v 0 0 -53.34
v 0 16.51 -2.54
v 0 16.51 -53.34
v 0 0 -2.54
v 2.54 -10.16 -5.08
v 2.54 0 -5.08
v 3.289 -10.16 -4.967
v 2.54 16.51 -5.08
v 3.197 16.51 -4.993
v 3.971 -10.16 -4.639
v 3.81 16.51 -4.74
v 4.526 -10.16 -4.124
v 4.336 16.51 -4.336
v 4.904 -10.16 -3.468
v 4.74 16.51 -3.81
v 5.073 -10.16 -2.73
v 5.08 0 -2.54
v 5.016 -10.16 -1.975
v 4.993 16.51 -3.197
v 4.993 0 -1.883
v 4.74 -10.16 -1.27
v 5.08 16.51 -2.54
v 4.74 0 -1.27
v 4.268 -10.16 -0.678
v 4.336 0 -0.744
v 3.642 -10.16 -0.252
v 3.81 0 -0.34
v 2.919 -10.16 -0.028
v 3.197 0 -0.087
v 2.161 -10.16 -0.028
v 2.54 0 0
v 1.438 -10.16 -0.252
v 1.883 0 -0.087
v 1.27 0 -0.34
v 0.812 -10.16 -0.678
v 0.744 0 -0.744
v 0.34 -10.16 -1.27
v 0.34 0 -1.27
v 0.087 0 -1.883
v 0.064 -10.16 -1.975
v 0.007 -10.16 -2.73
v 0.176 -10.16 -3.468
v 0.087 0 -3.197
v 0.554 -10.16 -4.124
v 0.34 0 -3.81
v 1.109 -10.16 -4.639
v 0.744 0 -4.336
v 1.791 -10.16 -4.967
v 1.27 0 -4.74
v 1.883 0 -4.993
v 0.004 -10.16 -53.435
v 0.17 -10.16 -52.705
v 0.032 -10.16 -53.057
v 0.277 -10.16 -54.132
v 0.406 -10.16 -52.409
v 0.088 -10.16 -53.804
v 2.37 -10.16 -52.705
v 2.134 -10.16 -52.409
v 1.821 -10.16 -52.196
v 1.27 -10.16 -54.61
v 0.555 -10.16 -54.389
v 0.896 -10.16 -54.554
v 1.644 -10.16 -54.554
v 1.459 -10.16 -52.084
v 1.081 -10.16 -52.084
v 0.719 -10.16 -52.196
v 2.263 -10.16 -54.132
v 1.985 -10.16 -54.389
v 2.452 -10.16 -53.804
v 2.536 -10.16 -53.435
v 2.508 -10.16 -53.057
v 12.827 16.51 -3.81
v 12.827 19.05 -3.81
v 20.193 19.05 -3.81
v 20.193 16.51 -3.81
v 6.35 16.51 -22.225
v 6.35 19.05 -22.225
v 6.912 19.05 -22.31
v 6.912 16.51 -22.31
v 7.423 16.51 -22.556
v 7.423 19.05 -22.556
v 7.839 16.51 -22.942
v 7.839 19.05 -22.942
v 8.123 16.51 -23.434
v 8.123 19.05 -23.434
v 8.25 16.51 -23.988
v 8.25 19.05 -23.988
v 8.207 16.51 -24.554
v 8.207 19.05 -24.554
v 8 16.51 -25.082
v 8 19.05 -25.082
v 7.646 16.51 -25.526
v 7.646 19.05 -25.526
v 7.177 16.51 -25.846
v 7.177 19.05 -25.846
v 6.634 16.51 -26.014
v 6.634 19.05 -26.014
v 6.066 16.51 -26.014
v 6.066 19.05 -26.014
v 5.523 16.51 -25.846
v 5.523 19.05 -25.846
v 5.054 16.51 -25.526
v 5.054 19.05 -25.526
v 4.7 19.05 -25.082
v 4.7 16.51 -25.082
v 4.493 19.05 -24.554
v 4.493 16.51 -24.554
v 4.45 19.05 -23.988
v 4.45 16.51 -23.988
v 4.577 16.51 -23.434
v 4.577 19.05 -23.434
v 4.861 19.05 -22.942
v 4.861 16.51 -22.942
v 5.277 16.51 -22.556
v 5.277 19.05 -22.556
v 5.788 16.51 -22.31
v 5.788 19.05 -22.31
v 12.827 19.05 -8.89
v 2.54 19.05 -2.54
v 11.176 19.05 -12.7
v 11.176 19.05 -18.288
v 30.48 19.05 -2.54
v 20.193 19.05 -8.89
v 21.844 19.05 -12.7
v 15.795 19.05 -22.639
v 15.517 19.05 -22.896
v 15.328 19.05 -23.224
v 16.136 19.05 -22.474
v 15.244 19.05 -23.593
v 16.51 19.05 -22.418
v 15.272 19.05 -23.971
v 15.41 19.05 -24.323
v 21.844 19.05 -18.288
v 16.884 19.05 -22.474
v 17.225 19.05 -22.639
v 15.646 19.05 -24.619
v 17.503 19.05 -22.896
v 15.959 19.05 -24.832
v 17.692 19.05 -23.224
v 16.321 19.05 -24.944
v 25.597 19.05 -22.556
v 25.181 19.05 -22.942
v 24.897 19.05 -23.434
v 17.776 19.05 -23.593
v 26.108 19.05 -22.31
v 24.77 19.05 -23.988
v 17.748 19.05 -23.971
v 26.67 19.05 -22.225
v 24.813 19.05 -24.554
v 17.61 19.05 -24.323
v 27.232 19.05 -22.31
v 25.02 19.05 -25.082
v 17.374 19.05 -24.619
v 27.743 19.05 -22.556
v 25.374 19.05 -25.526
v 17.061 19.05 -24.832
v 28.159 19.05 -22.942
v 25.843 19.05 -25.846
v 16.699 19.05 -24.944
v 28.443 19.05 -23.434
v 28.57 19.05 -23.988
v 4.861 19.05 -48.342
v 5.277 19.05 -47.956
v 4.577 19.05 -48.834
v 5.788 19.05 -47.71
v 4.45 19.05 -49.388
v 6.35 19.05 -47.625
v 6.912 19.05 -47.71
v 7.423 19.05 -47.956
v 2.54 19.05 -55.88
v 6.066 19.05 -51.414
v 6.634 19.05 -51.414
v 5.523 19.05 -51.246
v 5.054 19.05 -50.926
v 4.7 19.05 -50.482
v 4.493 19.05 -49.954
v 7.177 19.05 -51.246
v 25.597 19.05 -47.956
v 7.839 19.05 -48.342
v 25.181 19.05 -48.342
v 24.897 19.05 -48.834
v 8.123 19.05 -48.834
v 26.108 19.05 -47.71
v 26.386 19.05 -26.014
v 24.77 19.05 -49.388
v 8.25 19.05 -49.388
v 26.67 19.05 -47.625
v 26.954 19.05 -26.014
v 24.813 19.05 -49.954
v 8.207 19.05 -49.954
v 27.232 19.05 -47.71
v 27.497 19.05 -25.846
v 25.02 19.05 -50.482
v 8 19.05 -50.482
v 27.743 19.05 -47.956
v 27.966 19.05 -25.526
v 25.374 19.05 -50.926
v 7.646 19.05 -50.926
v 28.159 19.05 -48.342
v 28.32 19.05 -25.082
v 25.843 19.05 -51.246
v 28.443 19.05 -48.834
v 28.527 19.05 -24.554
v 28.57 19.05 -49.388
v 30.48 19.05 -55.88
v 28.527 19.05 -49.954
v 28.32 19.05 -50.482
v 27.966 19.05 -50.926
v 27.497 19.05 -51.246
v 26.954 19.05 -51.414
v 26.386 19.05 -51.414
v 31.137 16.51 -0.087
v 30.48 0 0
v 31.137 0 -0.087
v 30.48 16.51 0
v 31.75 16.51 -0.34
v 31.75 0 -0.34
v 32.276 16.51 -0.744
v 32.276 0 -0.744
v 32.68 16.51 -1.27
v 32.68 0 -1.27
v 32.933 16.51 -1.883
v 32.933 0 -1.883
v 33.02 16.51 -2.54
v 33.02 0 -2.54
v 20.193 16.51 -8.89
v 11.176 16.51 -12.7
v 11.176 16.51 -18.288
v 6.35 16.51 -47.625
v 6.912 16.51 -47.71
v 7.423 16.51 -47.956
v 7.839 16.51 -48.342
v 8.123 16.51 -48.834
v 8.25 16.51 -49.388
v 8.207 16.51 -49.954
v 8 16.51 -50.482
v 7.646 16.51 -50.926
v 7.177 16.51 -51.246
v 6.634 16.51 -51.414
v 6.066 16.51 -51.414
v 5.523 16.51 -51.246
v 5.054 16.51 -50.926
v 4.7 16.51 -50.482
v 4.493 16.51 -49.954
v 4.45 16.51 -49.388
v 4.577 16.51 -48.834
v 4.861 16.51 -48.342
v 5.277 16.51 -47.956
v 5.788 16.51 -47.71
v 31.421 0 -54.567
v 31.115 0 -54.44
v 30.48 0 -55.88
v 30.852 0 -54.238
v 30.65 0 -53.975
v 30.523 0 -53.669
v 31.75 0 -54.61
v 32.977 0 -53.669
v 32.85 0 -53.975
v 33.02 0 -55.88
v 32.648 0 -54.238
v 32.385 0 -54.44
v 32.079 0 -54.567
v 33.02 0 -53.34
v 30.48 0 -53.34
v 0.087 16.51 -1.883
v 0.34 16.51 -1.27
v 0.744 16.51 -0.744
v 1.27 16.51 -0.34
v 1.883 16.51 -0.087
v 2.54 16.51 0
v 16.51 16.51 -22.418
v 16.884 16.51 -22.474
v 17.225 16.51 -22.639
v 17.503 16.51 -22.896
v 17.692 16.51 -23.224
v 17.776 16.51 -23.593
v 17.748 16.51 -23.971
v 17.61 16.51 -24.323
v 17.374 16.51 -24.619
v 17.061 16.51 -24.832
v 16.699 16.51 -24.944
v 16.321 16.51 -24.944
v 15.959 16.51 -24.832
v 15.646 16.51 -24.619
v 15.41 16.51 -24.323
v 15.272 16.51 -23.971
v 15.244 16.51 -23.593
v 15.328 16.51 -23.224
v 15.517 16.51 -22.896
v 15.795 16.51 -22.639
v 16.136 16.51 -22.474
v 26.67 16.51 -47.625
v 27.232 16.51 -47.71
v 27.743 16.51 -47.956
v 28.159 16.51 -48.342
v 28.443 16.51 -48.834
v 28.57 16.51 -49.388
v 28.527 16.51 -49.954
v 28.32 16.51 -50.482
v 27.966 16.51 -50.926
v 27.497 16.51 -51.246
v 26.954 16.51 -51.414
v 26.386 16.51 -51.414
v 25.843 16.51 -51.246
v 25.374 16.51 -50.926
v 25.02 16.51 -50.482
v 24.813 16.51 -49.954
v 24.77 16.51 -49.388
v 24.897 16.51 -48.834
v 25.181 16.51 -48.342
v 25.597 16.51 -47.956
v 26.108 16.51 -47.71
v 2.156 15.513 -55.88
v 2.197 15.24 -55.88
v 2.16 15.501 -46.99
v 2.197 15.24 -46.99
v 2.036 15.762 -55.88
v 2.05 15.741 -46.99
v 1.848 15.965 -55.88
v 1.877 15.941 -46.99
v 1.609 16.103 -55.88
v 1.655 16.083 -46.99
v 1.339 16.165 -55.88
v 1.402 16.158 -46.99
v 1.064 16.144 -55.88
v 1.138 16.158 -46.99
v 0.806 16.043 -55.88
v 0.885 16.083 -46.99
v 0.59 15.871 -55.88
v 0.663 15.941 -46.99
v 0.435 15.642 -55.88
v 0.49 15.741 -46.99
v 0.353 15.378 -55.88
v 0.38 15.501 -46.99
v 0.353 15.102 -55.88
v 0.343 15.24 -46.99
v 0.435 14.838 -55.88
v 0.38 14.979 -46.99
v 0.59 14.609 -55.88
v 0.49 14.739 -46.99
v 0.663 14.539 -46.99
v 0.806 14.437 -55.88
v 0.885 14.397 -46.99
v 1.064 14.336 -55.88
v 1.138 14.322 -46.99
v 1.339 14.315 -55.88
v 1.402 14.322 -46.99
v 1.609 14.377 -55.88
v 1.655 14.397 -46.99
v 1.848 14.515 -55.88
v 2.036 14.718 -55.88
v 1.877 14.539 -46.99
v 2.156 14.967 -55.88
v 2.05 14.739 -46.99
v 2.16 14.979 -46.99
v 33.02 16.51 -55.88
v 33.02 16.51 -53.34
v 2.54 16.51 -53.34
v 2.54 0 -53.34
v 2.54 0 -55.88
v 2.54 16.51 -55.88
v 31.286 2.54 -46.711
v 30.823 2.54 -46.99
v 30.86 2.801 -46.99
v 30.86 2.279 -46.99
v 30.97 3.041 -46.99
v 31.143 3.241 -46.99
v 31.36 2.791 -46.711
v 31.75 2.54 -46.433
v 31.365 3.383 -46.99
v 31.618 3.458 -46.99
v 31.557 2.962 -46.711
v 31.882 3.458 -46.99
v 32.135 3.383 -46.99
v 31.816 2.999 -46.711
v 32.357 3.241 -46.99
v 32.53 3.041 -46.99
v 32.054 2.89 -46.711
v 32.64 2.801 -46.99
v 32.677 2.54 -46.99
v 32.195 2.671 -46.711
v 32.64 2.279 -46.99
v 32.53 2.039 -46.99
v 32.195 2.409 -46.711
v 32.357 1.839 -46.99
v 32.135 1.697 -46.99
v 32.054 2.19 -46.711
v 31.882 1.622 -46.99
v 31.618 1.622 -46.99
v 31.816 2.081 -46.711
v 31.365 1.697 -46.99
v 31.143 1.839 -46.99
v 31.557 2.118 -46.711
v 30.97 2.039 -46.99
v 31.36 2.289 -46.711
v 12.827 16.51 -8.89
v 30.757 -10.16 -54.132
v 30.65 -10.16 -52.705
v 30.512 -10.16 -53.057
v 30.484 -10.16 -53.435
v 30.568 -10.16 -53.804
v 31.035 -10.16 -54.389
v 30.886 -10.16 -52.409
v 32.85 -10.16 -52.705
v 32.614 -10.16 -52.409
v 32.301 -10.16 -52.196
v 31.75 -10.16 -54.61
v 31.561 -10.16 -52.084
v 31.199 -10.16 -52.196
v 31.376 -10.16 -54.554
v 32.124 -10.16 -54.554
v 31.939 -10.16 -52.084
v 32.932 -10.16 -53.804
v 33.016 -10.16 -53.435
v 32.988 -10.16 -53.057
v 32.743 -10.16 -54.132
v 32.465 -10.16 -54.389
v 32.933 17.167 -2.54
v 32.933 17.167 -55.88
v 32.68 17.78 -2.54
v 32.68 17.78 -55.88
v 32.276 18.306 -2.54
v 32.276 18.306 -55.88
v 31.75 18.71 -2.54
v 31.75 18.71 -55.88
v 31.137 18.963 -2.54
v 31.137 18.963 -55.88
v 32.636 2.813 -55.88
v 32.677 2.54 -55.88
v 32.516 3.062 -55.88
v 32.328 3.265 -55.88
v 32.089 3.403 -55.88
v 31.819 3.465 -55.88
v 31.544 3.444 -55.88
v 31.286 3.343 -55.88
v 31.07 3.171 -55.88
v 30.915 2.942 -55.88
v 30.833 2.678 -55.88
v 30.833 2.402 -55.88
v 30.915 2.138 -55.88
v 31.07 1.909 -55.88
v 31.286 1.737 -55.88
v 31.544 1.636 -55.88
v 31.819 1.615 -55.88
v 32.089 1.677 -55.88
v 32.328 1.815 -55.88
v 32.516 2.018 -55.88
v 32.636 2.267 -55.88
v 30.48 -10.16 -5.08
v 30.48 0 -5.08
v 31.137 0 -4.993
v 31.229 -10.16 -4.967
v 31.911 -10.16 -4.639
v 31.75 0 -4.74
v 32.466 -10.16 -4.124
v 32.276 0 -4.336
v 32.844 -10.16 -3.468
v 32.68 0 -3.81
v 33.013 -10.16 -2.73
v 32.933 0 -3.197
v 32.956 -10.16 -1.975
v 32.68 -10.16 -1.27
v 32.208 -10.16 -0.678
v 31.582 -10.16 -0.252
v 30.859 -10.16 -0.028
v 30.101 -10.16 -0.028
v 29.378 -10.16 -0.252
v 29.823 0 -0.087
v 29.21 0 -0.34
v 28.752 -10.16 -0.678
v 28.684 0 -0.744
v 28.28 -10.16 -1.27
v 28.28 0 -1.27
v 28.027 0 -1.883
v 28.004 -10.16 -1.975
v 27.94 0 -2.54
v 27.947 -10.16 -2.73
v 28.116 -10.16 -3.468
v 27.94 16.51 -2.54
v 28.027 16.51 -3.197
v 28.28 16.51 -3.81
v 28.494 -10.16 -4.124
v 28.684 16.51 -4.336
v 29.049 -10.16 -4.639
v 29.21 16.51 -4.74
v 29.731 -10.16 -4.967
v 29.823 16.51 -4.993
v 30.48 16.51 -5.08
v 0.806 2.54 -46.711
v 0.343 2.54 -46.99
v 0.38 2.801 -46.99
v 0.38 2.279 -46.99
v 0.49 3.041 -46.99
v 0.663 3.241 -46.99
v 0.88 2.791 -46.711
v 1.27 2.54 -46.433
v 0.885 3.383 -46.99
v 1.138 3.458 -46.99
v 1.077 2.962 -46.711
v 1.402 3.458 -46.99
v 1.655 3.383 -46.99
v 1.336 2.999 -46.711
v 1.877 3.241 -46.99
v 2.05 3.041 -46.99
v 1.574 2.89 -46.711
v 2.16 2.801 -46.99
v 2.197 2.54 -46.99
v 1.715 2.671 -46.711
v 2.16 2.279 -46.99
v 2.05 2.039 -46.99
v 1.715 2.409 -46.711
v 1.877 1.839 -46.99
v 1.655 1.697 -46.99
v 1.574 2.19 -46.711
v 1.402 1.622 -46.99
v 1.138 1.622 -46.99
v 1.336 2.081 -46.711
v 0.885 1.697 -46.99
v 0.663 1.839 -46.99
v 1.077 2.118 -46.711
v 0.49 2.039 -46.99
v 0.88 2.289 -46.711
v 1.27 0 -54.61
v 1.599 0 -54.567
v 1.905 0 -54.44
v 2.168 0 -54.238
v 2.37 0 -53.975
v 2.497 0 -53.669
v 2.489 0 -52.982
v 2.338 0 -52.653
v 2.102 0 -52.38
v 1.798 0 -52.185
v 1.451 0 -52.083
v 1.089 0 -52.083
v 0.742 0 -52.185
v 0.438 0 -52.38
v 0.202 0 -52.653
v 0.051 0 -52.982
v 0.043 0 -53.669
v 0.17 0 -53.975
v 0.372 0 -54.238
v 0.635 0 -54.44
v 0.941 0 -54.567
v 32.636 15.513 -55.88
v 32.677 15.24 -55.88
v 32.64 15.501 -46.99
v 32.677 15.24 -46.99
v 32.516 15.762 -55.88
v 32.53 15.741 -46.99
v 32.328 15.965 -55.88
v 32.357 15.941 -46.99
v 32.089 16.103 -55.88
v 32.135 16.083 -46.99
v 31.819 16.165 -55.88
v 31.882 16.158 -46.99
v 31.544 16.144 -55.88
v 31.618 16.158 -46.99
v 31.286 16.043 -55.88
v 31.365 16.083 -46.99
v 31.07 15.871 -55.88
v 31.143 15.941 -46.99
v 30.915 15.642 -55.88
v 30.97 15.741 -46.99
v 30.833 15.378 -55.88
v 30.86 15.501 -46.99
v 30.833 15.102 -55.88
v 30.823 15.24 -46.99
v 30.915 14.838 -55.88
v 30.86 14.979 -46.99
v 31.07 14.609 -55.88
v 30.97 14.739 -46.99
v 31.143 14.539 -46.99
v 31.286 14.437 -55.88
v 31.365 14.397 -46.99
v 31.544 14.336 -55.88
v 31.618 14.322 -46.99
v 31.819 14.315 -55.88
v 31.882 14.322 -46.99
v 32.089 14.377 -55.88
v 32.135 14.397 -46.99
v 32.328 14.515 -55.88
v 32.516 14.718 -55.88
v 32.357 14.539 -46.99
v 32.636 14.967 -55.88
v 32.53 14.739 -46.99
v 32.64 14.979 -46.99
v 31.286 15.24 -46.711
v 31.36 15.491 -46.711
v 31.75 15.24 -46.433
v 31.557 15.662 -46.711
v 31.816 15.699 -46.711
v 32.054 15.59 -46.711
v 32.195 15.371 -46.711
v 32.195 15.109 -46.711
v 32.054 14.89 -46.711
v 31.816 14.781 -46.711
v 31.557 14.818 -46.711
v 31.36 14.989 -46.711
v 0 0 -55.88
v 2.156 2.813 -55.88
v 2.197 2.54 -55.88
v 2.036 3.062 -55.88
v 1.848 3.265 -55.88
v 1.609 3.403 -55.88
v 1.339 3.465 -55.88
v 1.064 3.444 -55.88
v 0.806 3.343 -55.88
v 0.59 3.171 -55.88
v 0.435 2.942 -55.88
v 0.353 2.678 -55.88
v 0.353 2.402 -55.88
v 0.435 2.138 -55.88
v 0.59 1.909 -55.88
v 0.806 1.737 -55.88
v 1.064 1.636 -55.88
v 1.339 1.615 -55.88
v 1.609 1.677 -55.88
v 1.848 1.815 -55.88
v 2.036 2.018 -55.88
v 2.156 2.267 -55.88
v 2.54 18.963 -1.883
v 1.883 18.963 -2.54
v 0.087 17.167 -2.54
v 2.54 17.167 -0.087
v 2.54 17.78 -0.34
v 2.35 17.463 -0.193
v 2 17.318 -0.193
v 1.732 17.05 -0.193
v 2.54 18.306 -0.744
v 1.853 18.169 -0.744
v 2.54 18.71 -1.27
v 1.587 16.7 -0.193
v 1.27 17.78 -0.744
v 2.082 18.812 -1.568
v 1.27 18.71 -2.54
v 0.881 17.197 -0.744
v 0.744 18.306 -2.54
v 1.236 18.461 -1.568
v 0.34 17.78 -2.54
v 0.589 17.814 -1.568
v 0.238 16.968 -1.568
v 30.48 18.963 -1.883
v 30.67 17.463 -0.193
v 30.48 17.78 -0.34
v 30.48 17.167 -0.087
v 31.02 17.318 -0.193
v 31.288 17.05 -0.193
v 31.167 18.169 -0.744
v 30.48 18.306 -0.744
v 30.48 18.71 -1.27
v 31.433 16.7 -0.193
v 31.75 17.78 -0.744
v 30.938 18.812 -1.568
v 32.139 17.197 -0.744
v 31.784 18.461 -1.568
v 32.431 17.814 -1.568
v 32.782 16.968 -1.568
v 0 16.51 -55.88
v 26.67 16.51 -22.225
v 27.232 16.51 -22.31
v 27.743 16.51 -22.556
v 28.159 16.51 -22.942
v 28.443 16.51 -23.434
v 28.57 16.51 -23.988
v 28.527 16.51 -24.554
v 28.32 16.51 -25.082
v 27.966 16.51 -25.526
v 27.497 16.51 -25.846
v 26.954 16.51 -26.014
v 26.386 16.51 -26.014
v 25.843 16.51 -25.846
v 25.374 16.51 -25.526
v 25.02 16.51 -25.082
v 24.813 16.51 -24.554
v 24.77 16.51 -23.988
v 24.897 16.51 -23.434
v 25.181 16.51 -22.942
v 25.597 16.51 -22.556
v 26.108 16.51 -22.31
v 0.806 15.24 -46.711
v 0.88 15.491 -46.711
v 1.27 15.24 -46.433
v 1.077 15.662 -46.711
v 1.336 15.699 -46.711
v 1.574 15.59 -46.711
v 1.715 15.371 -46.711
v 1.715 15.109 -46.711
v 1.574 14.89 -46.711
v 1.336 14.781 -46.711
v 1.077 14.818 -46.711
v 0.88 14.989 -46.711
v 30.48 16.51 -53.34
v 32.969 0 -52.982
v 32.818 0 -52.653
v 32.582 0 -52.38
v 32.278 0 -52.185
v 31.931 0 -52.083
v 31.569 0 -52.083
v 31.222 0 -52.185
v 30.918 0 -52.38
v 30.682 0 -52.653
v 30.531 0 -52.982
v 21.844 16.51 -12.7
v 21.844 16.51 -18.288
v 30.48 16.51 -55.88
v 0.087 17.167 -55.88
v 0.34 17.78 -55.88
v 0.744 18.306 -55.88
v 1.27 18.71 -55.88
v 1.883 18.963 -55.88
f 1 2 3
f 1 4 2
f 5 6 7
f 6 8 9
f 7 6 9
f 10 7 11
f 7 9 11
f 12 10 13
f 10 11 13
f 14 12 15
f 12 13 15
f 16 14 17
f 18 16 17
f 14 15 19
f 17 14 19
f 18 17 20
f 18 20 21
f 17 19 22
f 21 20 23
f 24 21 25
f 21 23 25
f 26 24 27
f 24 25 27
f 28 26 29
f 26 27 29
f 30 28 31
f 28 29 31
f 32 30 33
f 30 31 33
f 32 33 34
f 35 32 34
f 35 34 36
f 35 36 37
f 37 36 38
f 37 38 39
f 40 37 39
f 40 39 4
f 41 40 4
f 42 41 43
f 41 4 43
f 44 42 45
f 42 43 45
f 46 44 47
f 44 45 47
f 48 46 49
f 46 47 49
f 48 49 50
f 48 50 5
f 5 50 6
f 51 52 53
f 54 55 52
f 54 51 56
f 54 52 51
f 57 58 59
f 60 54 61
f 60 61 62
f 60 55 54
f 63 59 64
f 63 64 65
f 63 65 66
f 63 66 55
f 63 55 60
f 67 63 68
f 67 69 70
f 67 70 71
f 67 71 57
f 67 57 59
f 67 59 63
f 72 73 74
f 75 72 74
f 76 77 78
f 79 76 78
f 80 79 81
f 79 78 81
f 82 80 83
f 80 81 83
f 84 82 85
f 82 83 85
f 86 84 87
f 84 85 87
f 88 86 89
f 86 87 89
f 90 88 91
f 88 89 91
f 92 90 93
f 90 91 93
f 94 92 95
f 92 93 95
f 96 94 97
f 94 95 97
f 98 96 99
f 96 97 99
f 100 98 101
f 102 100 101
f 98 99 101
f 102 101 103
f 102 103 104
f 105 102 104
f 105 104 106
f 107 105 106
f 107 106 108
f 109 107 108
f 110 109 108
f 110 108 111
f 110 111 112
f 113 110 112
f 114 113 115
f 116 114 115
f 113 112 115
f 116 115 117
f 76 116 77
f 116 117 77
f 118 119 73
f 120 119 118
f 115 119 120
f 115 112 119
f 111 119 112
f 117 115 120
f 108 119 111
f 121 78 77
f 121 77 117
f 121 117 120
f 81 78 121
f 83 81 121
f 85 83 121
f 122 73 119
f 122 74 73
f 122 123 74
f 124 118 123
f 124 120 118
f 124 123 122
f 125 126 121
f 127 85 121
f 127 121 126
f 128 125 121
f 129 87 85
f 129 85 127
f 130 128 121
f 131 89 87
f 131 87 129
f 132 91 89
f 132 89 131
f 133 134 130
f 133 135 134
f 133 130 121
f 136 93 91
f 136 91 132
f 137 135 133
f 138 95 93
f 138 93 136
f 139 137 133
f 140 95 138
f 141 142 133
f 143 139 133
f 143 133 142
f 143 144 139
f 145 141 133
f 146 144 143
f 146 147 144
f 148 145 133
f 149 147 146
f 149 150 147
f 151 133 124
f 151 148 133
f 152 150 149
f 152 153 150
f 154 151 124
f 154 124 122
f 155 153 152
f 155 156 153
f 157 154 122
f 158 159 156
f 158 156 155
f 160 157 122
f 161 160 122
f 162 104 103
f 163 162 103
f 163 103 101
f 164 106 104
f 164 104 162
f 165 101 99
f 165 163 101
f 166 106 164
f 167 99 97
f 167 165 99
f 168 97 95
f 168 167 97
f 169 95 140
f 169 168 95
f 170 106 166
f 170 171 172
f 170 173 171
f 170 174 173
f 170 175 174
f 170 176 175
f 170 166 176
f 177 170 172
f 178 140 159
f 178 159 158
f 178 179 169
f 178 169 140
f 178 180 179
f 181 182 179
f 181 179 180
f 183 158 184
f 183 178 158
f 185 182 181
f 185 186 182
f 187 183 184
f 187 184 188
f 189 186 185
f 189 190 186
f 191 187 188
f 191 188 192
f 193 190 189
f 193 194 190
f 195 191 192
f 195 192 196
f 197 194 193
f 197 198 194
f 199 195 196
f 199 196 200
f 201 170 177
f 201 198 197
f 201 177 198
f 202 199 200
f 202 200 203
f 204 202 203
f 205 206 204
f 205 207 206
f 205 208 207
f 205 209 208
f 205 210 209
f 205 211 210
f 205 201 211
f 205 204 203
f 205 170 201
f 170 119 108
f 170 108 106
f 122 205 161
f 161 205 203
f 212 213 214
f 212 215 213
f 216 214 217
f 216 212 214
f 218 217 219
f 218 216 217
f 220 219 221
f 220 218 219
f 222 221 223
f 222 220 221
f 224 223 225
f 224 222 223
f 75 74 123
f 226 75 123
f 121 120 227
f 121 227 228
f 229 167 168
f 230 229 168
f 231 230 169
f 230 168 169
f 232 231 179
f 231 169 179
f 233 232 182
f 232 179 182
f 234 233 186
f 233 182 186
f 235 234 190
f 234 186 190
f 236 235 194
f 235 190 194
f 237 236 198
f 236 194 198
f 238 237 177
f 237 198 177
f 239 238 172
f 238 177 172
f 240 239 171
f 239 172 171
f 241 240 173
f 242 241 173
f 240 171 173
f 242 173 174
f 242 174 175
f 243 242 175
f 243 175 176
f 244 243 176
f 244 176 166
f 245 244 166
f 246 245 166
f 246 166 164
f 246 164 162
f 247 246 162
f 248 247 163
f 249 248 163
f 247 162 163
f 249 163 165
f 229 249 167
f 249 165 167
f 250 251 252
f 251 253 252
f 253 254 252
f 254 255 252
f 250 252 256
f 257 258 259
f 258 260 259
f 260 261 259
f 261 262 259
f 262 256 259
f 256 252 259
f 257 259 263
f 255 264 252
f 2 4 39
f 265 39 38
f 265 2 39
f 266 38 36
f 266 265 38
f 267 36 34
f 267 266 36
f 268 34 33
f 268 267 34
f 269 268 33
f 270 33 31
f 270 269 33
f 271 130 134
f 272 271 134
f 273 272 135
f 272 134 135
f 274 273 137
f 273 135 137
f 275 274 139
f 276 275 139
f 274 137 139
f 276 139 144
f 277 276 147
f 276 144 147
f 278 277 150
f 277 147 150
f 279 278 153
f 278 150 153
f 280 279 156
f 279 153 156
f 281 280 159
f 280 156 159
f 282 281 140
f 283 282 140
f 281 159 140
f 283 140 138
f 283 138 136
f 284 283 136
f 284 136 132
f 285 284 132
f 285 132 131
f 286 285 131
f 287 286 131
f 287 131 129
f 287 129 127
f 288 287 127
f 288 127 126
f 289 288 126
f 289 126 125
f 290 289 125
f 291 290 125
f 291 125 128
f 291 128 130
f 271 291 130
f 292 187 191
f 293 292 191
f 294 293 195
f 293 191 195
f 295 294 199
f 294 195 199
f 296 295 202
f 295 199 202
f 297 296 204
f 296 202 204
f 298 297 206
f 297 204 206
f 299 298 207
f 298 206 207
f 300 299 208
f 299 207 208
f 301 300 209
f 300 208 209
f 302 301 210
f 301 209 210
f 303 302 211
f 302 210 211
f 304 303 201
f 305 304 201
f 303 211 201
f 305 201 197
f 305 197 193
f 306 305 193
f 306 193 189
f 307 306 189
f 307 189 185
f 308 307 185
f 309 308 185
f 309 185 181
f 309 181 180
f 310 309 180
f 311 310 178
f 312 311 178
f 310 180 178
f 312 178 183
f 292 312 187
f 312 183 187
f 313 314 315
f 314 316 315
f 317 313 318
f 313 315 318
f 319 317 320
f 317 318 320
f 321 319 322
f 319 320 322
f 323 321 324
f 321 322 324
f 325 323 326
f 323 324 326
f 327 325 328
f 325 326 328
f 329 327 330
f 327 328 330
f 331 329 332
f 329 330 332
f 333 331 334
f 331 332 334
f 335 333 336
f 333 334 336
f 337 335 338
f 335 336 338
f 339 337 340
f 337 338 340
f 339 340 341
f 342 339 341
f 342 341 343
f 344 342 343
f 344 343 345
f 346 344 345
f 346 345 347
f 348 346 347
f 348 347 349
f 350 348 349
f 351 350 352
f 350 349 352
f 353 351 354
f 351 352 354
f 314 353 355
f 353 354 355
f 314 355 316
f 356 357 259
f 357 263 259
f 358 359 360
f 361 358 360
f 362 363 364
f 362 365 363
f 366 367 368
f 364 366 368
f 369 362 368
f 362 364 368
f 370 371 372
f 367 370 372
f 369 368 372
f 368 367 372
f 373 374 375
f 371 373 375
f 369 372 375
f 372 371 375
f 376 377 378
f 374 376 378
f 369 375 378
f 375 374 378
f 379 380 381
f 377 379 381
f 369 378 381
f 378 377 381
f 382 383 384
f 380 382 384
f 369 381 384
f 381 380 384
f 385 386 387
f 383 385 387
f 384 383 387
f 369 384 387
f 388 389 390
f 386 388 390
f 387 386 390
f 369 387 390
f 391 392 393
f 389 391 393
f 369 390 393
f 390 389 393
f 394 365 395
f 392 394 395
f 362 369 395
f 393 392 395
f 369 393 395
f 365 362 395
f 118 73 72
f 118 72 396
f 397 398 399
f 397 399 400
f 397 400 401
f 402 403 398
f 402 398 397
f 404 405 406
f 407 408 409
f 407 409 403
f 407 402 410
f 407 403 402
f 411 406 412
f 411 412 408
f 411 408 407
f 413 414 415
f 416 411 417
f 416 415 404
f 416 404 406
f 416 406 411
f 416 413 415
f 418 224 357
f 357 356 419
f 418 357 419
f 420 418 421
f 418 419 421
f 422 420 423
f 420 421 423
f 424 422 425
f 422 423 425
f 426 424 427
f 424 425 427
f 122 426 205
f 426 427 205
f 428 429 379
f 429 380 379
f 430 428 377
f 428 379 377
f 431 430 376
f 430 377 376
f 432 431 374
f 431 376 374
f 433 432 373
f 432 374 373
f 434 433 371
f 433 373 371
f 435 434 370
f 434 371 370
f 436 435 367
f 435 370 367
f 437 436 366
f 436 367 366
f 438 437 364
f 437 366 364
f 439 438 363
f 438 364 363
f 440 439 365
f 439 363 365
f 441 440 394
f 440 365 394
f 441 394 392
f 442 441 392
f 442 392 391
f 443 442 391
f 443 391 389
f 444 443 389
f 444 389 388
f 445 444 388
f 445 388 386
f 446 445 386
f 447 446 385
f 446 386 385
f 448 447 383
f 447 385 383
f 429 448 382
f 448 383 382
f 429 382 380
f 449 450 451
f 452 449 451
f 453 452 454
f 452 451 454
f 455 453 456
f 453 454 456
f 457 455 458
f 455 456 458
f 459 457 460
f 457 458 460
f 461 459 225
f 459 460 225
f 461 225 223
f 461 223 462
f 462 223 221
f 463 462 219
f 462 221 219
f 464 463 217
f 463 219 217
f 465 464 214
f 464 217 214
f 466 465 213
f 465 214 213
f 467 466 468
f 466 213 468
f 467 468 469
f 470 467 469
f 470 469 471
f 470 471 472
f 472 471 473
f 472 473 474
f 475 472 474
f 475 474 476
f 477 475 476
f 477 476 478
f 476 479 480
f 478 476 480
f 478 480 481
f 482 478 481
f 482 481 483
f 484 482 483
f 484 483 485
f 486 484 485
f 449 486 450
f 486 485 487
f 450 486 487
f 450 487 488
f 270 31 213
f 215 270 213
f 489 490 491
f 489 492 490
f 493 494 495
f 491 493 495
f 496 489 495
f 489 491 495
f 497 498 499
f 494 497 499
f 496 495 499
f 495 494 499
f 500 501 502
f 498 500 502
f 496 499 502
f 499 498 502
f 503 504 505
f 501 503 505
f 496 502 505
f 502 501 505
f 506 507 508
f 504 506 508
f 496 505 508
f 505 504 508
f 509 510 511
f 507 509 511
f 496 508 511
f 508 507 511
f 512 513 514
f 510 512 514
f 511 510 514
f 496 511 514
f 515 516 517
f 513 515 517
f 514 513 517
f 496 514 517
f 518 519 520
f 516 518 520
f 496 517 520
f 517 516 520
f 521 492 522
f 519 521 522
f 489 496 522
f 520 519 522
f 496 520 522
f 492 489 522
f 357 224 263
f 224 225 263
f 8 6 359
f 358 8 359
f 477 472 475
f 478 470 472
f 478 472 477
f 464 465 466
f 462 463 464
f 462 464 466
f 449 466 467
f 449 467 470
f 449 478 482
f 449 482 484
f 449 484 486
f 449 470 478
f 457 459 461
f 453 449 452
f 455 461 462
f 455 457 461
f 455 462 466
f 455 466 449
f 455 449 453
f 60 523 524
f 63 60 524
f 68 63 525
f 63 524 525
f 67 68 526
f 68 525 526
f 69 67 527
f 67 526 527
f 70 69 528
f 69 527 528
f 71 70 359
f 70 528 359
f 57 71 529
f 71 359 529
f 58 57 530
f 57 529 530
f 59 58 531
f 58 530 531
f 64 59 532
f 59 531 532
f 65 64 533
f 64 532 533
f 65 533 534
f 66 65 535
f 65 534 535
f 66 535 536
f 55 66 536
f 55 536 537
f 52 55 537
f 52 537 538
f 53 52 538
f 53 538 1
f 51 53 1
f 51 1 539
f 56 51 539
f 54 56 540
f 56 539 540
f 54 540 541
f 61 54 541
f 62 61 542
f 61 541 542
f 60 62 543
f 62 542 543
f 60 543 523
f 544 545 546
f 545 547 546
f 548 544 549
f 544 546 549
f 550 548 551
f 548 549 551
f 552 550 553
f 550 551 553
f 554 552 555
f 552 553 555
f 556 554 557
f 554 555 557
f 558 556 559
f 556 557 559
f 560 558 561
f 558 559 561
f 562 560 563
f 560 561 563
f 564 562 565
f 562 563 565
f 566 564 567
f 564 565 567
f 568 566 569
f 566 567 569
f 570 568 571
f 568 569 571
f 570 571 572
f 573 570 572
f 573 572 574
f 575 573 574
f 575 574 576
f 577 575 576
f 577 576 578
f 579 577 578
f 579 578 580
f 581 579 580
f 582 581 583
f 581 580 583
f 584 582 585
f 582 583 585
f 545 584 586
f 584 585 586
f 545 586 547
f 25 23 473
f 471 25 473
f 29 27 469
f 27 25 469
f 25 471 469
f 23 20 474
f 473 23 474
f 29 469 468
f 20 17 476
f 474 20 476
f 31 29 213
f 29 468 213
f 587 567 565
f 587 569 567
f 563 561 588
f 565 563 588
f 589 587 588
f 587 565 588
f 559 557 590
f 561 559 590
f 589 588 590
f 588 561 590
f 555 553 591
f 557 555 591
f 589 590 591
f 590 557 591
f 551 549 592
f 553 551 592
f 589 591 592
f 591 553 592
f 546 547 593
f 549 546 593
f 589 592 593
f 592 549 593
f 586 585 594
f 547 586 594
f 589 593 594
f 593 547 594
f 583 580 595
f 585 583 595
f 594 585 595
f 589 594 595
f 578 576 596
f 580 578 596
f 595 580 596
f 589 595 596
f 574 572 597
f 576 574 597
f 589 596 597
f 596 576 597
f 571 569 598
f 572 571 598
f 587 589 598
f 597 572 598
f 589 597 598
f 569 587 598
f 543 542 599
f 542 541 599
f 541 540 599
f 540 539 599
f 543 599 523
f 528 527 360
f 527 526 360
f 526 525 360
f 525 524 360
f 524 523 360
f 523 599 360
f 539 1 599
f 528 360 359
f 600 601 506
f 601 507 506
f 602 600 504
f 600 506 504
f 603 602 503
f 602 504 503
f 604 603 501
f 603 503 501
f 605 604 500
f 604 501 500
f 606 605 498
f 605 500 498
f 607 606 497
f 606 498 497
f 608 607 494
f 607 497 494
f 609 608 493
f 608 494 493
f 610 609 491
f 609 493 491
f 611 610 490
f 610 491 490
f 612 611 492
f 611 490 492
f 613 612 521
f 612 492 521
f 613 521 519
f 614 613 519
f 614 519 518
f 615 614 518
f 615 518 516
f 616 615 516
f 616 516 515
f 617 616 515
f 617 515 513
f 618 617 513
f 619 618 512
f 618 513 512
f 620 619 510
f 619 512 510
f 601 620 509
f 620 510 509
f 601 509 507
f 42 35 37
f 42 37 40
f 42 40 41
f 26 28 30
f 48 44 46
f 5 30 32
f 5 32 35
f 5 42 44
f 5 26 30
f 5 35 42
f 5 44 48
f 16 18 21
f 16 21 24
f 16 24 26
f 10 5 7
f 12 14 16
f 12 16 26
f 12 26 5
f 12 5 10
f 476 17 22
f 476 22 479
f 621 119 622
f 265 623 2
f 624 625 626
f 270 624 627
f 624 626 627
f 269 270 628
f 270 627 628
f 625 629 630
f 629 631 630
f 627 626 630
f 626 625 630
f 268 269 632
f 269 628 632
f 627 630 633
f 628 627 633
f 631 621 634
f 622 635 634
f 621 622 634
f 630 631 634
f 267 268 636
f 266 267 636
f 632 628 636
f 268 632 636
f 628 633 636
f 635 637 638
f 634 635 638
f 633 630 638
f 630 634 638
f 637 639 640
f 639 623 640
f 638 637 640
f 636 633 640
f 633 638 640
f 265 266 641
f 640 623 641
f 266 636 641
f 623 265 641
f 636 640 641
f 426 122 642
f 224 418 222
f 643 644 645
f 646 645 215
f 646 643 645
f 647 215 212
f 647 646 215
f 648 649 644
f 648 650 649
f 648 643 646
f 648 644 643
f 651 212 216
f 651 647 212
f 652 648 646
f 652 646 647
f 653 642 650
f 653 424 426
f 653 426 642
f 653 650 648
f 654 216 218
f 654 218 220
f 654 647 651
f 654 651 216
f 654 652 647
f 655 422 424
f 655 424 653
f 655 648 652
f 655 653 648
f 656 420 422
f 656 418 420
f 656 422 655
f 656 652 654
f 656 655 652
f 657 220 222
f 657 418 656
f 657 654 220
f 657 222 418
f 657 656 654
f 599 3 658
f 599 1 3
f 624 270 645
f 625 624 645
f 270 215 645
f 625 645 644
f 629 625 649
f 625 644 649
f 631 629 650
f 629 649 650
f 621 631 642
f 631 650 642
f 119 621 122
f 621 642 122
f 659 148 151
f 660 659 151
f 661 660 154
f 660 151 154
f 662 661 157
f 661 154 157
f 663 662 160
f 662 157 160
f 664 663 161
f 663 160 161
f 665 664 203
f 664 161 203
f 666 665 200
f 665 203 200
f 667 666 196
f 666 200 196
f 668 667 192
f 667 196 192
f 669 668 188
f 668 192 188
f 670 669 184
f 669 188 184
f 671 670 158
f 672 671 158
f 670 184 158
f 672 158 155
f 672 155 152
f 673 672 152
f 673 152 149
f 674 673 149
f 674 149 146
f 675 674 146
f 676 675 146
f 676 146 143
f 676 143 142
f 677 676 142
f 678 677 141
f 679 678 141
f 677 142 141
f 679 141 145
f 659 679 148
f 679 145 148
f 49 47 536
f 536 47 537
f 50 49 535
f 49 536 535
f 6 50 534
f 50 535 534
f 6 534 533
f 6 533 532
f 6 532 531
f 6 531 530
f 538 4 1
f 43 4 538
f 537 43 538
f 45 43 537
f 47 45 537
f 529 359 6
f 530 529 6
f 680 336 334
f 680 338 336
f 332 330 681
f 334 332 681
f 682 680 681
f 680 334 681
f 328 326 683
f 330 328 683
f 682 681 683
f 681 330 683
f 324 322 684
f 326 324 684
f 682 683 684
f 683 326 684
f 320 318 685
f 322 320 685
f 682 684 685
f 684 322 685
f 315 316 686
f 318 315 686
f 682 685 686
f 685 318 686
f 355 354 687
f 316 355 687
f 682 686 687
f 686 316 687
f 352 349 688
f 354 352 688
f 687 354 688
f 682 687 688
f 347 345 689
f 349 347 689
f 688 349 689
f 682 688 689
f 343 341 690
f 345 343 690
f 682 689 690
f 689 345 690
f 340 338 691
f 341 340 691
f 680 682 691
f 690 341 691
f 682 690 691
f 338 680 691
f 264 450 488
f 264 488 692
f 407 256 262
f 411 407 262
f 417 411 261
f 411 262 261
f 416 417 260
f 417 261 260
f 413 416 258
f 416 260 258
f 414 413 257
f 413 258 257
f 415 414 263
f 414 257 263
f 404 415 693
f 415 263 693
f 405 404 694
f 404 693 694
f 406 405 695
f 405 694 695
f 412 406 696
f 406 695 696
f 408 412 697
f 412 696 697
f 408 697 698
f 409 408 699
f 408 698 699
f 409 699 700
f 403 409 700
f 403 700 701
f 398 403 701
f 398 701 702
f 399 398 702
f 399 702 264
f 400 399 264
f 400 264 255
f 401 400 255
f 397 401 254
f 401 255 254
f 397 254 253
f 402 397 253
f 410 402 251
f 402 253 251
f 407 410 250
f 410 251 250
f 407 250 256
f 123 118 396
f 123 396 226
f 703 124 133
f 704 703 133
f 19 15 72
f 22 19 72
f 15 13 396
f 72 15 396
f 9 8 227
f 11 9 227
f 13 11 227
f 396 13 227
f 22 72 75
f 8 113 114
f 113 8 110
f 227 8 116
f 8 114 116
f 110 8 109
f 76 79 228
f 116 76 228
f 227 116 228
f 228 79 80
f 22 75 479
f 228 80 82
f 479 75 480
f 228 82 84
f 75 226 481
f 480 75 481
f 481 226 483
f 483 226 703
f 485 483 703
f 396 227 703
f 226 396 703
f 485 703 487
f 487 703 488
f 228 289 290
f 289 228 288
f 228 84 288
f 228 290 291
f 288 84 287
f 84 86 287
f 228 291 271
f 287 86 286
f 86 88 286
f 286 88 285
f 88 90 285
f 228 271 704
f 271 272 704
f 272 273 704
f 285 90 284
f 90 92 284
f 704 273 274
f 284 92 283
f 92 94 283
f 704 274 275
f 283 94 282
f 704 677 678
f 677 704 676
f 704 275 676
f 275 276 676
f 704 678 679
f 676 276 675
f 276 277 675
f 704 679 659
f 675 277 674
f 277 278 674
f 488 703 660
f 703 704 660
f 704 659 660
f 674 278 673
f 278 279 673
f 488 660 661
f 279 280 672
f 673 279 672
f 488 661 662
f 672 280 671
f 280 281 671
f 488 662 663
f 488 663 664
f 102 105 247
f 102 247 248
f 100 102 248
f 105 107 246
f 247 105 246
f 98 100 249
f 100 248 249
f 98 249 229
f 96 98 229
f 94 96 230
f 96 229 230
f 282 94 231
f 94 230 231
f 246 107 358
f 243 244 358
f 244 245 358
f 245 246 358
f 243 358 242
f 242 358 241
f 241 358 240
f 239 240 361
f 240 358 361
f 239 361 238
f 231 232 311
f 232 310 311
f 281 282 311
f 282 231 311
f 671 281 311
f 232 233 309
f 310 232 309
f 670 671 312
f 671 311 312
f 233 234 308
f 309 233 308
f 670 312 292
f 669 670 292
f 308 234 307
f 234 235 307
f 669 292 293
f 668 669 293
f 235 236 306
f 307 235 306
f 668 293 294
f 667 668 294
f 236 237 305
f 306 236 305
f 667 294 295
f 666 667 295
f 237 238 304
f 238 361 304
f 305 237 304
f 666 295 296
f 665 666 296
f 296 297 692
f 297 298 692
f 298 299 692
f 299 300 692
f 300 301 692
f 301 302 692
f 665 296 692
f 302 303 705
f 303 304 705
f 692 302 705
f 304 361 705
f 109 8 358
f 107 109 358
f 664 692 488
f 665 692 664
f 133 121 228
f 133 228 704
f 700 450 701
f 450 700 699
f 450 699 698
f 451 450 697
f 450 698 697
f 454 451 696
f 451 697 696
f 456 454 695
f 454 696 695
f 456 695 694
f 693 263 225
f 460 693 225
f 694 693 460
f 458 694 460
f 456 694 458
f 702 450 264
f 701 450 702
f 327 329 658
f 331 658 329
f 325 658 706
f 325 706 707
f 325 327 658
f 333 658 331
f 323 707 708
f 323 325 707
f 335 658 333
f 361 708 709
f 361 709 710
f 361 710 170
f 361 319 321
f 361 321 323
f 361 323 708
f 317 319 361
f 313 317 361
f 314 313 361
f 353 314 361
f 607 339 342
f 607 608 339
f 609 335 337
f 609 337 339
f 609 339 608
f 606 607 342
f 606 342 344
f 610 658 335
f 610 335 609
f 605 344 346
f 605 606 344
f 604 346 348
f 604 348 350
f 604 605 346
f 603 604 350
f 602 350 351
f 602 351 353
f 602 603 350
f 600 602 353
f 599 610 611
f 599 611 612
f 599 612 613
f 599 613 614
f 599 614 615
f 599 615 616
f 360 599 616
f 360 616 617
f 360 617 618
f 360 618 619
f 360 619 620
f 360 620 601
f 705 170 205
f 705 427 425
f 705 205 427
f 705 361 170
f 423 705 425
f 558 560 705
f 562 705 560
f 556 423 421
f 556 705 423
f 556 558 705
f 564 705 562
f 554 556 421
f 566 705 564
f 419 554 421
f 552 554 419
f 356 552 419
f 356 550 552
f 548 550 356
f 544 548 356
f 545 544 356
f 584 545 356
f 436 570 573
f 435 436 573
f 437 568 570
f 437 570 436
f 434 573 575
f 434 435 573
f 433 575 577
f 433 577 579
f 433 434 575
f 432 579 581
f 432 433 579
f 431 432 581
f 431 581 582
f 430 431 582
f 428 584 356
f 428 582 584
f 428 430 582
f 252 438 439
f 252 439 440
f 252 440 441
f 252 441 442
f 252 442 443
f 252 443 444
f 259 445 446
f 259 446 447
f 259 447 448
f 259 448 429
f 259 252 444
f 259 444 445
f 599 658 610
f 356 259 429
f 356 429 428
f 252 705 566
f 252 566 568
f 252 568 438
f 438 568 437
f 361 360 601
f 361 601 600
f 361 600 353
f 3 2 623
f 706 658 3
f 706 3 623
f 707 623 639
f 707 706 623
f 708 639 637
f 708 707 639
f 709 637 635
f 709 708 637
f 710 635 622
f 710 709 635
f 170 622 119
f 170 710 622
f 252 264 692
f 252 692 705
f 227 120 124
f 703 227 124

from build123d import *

# Parameters (mm, degrees)
SKETCH1_W                       = 33.02
SKETCH1_H                       = 55.88
BOSS_EXTRUDE1_DEPTH             = 19.05
SHELL2_T                        = -2.54
FILLET2_R                       = 2.54
SKETCH2_R                       = 1.905
CUT_EXTRUDE1_DEPTH              = 2.54
CUT_EXTRUDE2_REACH              = 69.645
SKETCH3_W                       = 10.668
SKETCH3_H                       = 5.588
CUT_EXTRUDE3_REACH              = 69.645
SKETCH4_R                       = 1.27
CUT_EXTRUDE4_REACH              = 69.645
SKETCH5_W                       = 7.366
SKETCH5_H                       = 5.08
BOSS_EXTRUDE2_START             = -16.51
SKETCH6_R                       = 2.54
SKETCH6_R_2                     = 1.27
BOSS_EXTRUDE2_DEPTH             = 26.67
F_49_0_073_DIAMETER_HOLE1_D     = 1.8542
F_49_0_073_DIAMETER_HOLE1_DEPTH = 8.89
F_49_0_073_DIAMETER_HOLE1_TIP   = 0.55705788


with BuildPart() as part:
    # Sketch1 → Boss-Extrude1 (new body)
    with BuildSketch(Plane(origin=(0, 0, 0), x_dir=(1, 0, 0), z_dir=(0, 1, 0))):
        with Locations((16.51, 27.94)):
            Rectangle(SKETCH1_W, SKETCH1_H)
    extrude(amount=BOSS_EXTRUDE1_DEPTH)

    # Shell2
    shell2_openings = [part.faces().sort_by_distance(p)[0] for p in [
        (16.51, 0, -27.94),
        (16.51, 9.525, -55.88),
    ]]
    offset(amount=SHELL2_T, openings=shell2_openings, kind=Kind.INTERSECTION)

    # Fillet2
    fillet2_edges = [part.edges().sort_by_distance(p)[0] for p in [
        (33.02, 19.05, -27.94),
        (0, 19.05, -27.94),
        (16.51, 19.05, 0),
        (33.02, 9.525, 0),
        (0, 9.525, 0),
    ]]
    fillet(fillet2_edges, radius=FILLET2_R)

    # Sketch2 → Cut-Extrude1 (cut)
    with BuildSketch(Plane(origin=(0, 19.05, 0), x_dir=(1, 0, 0), z_dir=(0, 1, 0))):
        with Locations(Location((26.67, 49.53, 0), (0, 0, 270))):
            Circle(SKETCH2_R)
        with Locations(Location((26.67, 24.13, 0), (0, 0, 270))):
            Circle(SKETCH2_R)
        with Locations(Location((6.35, 24.13, 0), (0, 0, 270))):
            Circle(SKETCH2_R)
        with Locations(Location((6.35, 49.53, 0), (0, 0, 270))):
            Circle(SKETCH2_R)
    extrude(amount=-CUT_EXTRUDE1_DEPTH, mode=Mode.SUBTRACT)

    # Sketch3 → Cut-Extrude2 (cut, up to next)
    with BuildSketch(Plane(origin=(0, 19.05, 0), x_dir=(1, 0, 0), z_dir=(0, 1, 0)), mode=Mode.PRIVATE) as cut_extrude2_sk1:
        with Locations((16.51, 15.494)):
            Rectangle(SKETCH3_W, SKETCH3_H)
    cut_extrude2_tool1 = extrude(cut_extrude2_sk1.sketch, amount=-CUT_EXTRUDE2_REACH, mode=Mode.PRIVATE) & part.part
    add(cut_extrude2_tool1.solids().sort_by_distance((16.51, 19.05, -15.494))[0], mode=Mode.SUBTRACT)

    # Sketch4 → Cut-Extrude3 (cut, up to next)
    with BuildSketch(Plane(origin=(0, 19.05, 0), x_dir=(1, 0, 0), z_dir=(0, 1, 0)), mode=Mode.PRIVATE) as cut_extrude3_sk1:
        with Locations(Location((16.51, 23.687982585, 0), (0, 0, 270))):
            Circle(SKETCH4_R)
    cut_extrude3_tool1 = extrude(cut_extrude3_sk1.sketch, amount=-CUT_EXTRUDE3_REACH, mode=Mode.PRIVATE) & part.part
    add(cut_extrude3_tool1.solids().sort_by_distance((16.51, 19.05, -23.687983))[0], mode=Mode.SUBTRACT)

    # Sketch5 → Cut-Extrude4 (cut, up to next)
    with BuildSketch(Plane(origin=(0, 19.05, 0), x_dir=(1, 0, 0), z_dir=(0, 1, 0)), mode=Mode.PRIVATE) as cut_extrude4_sk1:
        with Locations((16.51, 6.35)):
            Rectangle(SKETCH5_W, SKETCH5_H)
    cut_extrude4_tool1 = extrude(cut_extrude4_sk1.sketch, amount=-CUT_EXTRUDE4_REACH, mode=Mode.PRIVATE) & part.part
    add(cut_extrude4_tool1.solids().sort_by_distance((16.51, 19.05, -6.35))[0], mode=Mode.SUBTRACT)

    # Sketch6 → Boss-Extrude2 (add)
    with BuildSketch(Plane(origin=(0, 0, 0), x_dir=(-1, 0, 0), z_dir=(0, -1, 0)).offset(BOSS_EXTRUDE2_START)):
        with Locations(Location((-30.48, 2.54, 0), (0, 0, 90))):
            Circle(SKETCH6_R)
        with Locations(Location((-2.54, 2.54, 0), (0, 0, 90))):
            Circle(SKETCH6_R)
        with Locations(Location((-31.75, 53.34, 0), (0, 0, 90))):
            Circle(SKETCH6_R_2)
        with Locations(Location((-1.27, 53.34, 0), (0, 0, 90))):
            Circle(SKETCH6_R_2)
    extrude(amount=BOSS_EXTRUDE2_DEPTH)

    # #49 (0.073) Diameter Hole1
    with Locations(Plane(origin=(0, 0, -55.88), x_dir=(-1, 0, 0), z_dir=(0, 0, -1))):
        with Locations((-31.75, 15.24), (-31.75, 2.54), (-1.27, 2.54), (-1.27, 15.24)):
            Hole(F_49_0_073_DIAMETER_HOLE1_D / 2, depth=F_49_0_073_DIAMETER_HOLE1_DEPTH)
            with Locations((0, 0, -(F_49_0_073_DIAMETER_HOLE1_DEPTH + F_49_0_073_DIAMETER_HOLE1_TIP / 2))):  # 118° drill point
                Cone(0, F_49_0_073_DIAMETER_HOLE1_D / 2, F_49_0_073_DIAMETER_HOLE1_TIP, mode=Mode.SUBTRACT)


solid = part.part
